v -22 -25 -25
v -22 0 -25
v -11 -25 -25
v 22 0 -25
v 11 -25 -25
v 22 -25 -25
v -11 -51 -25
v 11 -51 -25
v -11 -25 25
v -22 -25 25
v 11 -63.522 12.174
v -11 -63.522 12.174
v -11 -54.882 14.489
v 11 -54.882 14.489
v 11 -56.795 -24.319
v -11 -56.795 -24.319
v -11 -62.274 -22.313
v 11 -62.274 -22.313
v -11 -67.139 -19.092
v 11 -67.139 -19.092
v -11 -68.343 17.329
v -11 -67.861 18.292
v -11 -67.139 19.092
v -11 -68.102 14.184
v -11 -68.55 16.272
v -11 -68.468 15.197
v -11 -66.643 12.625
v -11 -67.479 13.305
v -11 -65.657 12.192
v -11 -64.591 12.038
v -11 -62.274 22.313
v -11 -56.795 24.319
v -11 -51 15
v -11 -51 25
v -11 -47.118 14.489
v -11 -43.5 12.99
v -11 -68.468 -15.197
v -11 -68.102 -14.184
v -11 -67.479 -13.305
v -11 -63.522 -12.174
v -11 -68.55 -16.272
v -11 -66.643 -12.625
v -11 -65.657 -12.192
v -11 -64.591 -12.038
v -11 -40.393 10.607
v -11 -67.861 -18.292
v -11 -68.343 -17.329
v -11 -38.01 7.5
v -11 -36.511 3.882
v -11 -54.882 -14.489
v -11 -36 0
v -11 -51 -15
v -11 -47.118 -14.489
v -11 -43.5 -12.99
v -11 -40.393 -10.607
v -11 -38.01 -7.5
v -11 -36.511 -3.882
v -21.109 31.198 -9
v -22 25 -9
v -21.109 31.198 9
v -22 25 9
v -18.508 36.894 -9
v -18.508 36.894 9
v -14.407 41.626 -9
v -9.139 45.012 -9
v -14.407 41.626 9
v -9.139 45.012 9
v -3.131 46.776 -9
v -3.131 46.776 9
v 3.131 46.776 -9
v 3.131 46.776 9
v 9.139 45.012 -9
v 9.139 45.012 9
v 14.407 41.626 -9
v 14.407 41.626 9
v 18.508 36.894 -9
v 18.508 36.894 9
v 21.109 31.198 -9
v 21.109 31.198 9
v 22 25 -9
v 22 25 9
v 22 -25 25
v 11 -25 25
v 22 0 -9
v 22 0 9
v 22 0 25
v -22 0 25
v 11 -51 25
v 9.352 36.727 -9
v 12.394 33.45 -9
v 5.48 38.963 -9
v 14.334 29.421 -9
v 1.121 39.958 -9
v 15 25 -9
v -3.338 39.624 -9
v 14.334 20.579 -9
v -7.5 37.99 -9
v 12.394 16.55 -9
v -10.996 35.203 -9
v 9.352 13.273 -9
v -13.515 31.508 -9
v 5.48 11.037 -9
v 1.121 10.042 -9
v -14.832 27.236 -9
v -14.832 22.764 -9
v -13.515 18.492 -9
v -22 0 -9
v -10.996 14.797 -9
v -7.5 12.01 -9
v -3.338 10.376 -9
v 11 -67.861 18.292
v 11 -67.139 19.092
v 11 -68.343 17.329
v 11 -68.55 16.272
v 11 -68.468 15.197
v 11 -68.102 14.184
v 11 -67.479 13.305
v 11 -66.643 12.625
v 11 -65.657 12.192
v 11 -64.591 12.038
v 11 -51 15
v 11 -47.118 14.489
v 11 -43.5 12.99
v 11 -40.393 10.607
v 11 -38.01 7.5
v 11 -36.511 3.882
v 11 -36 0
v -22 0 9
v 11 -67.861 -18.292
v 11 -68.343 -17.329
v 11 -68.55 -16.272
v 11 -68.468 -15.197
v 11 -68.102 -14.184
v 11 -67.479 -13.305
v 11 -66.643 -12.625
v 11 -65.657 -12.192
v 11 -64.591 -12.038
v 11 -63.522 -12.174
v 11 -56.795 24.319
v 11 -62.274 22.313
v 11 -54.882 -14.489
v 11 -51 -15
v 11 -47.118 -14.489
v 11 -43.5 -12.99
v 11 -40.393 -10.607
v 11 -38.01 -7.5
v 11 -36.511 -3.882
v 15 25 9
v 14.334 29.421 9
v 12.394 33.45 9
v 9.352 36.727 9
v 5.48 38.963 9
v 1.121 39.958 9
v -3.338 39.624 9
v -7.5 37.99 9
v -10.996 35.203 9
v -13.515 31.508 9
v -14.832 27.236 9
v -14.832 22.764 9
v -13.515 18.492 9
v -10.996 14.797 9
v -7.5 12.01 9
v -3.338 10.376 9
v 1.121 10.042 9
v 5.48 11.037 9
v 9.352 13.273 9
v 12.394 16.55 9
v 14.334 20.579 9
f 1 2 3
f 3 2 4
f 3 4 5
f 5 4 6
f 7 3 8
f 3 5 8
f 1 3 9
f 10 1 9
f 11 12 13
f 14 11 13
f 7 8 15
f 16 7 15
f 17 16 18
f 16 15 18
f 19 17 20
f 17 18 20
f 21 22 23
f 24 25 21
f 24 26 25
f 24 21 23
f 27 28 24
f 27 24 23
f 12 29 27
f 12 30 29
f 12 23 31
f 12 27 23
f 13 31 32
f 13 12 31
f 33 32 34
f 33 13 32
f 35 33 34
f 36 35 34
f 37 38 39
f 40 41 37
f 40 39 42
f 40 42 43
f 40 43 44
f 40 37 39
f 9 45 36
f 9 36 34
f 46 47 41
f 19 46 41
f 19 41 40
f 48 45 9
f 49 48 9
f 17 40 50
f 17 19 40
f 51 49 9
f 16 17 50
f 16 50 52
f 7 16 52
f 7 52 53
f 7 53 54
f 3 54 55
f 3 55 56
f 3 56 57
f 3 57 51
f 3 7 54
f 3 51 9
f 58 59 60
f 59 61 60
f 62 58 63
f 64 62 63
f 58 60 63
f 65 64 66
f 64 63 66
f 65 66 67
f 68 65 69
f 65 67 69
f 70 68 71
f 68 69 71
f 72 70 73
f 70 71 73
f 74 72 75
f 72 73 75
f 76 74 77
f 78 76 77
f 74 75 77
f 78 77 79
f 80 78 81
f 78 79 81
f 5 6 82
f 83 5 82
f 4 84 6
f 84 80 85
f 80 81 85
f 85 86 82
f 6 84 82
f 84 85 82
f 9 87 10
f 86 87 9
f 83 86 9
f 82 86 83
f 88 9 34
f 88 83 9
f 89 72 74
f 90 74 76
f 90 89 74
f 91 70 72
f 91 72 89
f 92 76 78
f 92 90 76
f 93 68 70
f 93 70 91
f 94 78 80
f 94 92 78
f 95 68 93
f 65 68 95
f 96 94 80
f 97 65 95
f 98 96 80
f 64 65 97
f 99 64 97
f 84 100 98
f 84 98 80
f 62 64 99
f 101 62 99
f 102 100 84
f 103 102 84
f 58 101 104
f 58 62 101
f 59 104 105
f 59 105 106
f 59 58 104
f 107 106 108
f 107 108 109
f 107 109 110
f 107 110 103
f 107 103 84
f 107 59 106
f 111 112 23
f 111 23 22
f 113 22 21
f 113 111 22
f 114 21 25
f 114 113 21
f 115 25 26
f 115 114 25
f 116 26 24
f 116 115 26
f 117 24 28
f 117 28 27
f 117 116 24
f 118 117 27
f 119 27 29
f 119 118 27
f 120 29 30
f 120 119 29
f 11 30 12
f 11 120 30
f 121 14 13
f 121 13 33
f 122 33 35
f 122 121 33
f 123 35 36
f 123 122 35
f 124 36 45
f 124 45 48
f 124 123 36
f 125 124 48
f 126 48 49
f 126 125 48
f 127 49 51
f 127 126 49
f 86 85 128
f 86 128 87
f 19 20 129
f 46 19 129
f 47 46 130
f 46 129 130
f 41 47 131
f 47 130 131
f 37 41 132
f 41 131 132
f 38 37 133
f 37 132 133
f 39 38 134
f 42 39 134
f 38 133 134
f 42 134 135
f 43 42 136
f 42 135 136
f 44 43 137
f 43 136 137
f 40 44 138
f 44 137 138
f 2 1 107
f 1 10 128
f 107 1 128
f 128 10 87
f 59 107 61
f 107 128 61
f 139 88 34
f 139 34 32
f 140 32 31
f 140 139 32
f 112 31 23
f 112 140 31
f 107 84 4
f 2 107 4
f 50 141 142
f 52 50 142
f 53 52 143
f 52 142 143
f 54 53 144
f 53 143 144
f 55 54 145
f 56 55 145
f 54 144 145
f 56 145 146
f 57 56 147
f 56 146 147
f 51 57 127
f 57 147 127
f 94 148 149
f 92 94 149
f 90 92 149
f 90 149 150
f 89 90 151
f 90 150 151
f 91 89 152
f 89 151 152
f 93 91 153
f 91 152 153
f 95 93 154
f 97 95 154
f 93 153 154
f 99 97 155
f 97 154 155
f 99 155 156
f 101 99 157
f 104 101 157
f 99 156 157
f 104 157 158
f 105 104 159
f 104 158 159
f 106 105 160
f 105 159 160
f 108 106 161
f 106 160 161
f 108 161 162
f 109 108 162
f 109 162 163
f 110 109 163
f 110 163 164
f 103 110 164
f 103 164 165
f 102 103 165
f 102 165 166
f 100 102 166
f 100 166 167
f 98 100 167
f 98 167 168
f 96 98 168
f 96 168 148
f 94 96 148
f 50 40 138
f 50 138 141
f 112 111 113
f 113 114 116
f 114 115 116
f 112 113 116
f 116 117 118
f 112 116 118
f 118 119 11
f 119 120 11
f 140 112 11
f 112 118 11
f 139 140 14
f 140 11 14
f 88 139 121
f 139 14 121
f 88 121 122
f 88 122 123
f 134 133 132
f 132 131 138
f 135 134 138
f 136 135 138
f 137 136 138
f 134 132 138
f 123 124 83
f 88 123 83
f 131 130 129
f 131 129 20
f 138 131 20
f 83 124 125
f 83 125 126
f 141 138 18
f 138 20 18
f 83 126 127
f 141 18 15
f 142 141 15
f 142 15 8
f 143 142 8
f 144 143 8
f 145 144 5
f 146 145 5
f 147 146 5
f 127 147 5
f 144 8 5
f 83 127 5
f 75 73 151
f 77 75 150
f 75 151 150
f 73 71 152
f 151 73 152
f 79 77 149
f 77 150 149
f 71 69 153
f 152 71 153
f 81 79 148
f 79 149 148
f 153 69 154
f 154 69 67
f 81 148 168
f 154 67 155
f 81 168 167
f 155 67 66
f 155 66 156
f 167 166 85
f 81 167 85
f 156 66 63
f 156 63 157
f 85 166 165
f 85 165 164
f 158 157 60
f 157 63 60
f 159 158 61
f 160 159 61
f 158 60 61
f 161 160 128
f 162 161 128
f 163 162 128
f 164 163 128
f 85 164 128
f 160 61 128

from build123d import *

# Parameters (mm, degrees)
BOSS_EXTRUDE2_DEPTH = 9
BOSS_EXTRUDE3_DEPTH = 22
BOSS_EXTRUDE5_START = -11
BOSS_EXTRUDE5_DEPTH = 22
SKETCH4_R           = 15
CUT_EXTRUDE1_DEPTH  = 44


with BuildPart() as part:
    # Sketch1 → Boss-Extrude2 (new body)
    with BuildSketch(Plane(origin=(0, 0, 0), x_dir=(0, 1, 0), z_dir=(0, 0, 1))):
        with BuildLine():
            Line((0, 22), (25, 22))
            ThreePointArc((25, 22), (47, 0), (25, -22))
            Line((25, -22), (0, -22))
            Line((0, -22), (0, 22))
        make_face()
    extrude(amount=BOSS_EXTRUDE2_DEPTH)

    # Sketch2 → Boss-Extrude3 (add, symmetric)
    with BuildSketch(Plane.YZ):
        Polygon((25, 0), (25, 9), (0, 9), (0, 25), (-25, 25), (-25, 0), (0, 0), align=None)
    extrude(amount=BOSS_EXTRUDE3_DEPTH, both=True)

    # Sketch3 → Boss-Extrude5 (add)
    with BuildSketch(Plane.YZ.offset(22).offset(BOSS_EXTRUDE5_START)):
        with BuildLine():
            Line((-25, 25), (-51, 25))
            ThreePointArc((-51, 25), (-59.593288161, 23.476699056), (-67.139363205, 19.092431886))
            ThreePointArc((-67.139363205, 19.092431886), (-68.101737646, 14.184187501), (-63.521788912, 12.173939479))
            Line((-63.521788912, 12.173939479), (-54.882285677, 14.488887394))
            ThreePointArc((-54.882285677, 14.488887394), (-41.868578565, 11.900300104), (-36, 0))
            Line((-36, 0), (-25, 0))
            Line((-25, 0), (-25, 25))
        make_face()
    extrude(amount=-BOSS_EXTRUDE5_DEPTH)

    # Mirror1: part across plane


with BuildPart() as part_1:
    add(part.part)
    add(part.part.mirror(Plane(origin=(0, 25, 0), x_dir=(1, 0, 0), z_dir=(0, 0, 1))))

    # Sketch4 → Cut-Extrude1 (cut)
    with BuildSketch(Plane.XY.offset(9)):
        with Locations((0, 25)):
            Circle(SKETCH4_R)
    extrude(amount=-CUT_EXTRUDE1_DEPTH, mode=Mode.SUBTRACT)


solid = part_1.part
